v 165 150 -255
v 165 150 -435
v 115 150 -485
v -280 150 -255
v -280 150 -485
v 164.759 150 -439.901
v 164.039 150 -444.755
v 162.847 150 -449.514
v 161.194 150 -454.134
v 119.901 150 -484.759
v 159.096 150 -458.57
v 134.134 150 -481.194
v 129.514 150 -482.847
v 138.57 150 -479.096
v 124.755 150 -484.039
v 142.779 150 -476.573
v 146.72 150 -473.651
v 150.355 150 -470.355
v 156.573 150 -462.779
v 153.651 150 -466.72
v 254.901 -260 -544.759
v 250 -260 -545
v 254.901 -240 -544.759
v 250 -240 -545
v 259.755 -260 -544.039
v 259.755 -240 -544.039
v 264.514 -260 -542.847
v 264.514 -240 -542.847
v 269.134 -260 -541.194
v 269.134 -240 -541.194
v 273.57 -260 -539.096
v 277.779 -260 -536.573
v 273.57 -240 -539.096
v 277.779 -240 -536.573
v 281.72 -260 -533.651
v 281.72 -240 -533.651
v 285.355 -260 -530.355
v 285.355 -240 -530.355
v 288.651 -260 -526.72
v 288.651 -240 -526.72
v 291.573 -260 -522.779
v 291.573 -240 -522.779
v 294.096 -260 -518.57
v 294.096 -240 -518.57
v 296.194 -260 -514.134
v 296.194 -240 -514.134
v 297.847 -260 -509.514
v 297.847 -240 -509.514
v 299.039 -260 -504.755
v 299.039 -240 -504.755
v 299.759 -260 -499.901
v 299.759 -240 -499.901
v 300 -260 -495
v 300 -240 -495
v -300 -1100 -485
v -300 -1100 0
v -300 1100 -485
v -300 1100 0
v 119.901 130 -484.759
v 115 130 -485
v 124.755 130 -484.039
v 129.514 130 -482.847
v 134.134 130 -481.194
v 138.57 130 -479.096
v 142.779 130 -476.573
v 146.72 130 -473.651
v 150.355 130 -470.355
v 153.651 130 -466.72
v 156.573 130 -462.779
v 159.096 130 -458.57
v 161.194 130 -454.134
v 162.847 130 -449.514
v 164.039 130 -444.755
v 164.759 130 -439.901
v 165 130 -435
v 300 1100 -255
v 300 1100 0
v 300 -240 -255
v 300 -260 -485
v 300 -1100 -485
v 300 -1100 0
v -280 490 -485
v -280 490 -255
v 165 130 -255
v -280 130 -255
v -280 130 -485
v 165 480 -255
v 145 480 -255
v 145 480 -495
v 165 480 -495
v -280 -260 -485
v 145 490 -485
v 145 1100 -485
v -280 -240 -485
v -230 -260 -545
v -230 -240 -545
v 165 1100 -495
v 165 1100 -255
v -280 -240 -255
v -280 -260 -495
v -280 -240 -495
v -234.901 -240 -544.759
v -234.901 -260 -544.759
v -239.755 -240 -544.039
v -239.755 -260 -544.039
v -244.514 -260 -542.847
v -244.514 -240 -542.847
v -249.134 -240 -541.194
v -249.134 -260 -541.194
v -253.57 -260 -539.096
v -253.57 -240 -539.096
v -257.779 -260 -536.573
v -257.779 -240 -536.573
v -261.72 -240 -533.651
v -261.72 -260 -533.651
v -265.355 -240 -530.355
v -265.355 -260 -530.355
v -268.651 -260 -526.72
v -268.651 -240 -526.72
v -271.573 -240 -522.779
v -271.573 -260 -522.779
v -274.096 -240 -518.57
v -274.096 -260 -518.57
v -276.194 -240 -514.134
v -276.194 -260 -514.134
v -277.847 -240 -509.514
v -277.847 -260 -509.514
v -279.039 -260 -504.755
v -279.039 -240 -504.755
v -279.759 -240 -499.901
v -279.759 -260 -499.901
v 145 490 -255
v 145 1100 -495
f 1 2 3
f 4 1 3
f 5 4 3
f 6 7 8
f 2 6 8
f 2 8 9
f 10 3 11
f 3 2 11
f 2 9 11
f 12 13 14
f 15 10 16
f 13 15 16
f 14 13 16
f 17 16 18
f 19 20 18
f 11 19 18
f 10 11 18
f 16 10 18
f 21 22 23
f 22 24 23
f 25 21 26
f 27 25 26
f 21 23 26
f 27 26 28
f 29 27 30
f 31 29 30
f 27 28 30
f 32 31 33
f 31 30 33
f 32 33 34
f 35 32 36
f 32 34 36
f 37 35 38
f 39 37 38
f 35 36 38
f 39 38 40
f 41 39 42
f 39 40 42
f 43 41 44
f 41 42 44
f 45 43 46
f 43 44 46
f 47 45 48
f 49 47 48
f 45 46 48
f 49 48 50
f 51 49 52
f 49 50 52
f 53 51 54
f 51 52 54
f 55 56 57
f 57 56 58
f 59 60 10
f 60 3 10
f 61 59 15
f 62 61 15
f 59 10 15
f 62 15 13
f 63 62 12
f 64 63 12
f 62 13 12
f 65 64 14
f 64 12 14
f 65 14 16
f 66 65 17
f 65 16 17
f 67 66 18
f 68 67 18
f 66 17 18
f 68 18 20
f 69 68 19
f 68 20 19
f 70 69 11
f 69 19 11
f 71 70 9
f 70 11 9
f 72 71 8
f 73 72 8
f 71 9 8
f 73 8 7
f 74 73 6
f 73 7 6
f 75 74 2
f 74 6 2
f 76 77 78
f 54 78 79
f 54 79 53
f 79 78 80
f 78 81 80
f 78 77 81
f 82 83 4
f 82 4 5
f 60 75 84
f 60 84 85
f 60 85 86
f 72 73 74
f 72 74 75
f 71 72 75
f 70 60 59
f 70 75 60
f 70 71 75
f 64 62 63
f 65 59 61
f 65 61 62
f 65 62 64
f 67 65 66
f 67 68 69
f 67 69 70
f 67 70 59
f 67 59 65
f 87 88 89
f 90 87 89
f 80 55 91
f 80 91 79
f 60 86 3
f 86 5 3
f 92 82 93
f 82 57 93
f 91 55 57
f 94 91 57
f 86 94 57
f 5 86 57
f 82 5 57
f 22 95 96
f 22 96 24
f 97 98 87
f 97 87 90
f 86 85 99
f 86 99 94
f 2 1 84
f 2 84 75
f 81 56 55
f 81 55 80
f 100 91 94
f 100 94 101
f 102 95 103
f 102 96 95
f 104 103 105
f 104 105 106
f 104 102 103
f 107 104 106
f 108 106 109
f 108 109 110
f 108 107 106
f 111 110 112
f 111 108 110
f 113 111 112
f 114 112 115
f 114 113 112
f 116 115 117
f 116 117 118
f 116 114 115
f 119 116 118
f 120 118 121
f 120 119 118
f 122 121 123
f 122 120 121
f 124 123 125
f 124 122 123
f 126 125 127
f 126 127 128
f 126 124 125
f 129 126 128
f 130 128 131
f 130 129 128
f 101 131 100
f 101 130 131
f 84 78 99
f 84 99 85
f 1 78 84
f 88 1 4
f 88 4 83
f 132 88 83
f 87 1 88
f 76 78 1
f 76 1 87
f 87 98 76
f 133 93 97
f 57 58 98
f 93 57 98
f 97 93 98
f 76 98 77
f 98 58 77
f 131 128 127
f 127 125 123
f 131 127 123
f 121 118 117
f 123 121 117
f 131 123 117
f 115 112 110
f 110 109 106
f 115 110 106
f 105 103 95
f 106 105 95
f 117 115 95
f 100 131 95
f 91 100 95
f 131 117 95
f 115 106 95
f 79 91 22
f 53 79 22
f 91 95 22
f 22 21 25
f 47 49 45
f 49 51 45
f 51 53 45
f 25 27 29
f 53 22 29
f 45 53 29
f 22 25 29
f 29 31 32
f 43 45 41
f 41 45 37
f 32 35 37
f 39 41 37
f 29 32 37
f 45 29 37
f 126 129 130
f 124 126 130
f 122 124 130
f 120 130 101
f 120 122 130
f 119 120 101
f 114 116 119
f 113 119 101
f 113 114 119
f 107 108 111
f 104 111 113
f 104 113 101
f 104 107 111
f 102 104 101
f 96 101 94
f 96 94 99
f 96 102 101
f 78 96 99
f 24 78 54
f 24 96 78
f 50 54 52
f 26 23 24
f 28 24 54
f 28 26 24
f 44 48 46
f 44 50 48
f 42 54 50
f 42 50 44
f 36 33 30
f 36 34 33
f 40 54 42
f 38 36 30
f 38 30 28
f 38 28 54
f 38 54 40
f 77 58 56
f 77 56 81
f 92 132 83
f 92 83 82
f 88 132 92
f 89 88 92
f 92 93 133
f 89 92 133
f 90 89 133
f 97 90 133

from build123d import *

# Parameters (mm, degrees)
SKETCH_1_W          = 600
SKETCH_1_H          = 2200
EXTRUDE_1_DEPTH     = 485
SKETCH_2_W          = 230
SKETCH_2_H          = 1360
CUT_EXTRUDE_1_DEPTH = 135
SKETCH_3_W          = 230
SKETCH_3_H          = 390
CUT_EXTRUDE_2_DEPTH = 445
SKETCH_4_W          = 230
SKETCH_4_H          = 340
CUT_EXTRUDE_3_DEPTH = 445
SKETCH_5_W          = 580
SKETCH_5_H          = 290
EXTRUDE_2_DEPTH     = 20
FILLET_1_R          = 50
SKETCH_6_W          = 230
SKETCH_6_H          = 610
CUT_EXTRUDE_4_DEPTH = 20
SKETCH_7_W          = 240
SKETCH_7_H          = 620
EXTRUDE_3_DEPTH     = 20
FILLET_2_R          = 50
FILLET_3_R          = 50


with BuildPart() as part:
    # 스케치1 → 보스-돌출1 (new body)
    with BuildSketch(Plane.XY):
        Rectangle(SKETCH_1_W, SKETCH_1_H)
    extrude(amount=-EXTRUDE_1_DEPTH)

    # 스케치2 → 컷-돌출1 (cut)
    with BuildSketch(Plane(origin=(300, 0, 0), x_dir=(0, 0, -1), z_dir=(1, 0, 0))):
        with Locations((370, 420)):
            Rectangle(SKETCH_2_W, SKETCH_2_H)
    extrude(amount=-CUT_EXTRUDE_1_DEPTH, mode=Mode.SUBTRACT)

    # 스케치3 → 컷-돌출2 (cut)
    with BuildSketch(Plane(origin=(165, 0, 0), x_dir=(0, 0, -1), z_dir=(1, 0, 0))):
        with Locations((370, -65)):
            Rectangle(SKETCH_3_W, SKETCH_3_H)
    extrude(amount=-CUT_EXTRUDE_2_DEPTH, mode=Mode.SUBTRACT)

    # 스케치4 → 컷-돌출3 (cut)
    with BuildSketch(Plane(origin=(165, 0, 0), x_dir=(0, 0, -1), z_dir=(1, 0, 0))):
        with Locations((370, 320)):
            Rectangle(SKETCH_4_W, SKETCH_4_H)
    extrude(amount=-CUT_EXTRUDE_3_DEPTH, mode=Mode.SUBTRACT)

    # 스케치5 → 보스-돌출2 (add)
    with BuildSketch(Plane(origin=(0, -260, 0), x_dir=(1, 0, 0), z_dir=(0, 1, 0))):
        with Locations((10, 400)):
            Rectangle(SKETCH_5_W, SKETCH_5_H)
    extrude(amount=EXTRUDE_2_DEPTH)

    # 필렛1
    fillet_1_edges = [part.edges().sort_by_distance(p)[0] for p in [
        (300, -250, -545),
    ]]
    fillet(fillet_1_edges, radius=FILLET_1_R)

    # 스케치6 → 컷-돌출4 (cut)
    with BuildSketch(Plane(origin=(165, 0, 0), x_dir=(0, 0, -1), z_dir=(1, 0, 0))):
        with Locations((370, 795)):
            Rectangle(SKETCH_6_W, SKETCH_6_H)
    extrude(amount=-CUT_EXTRUDE_4_DEPTH, mode=Mode.SUBTRACT)

    # 스케치7 → 보스-돌출3 (add)
    with BuildSketch(Plane(origin=(145, 0, 0), x_dir=(0, 0, -1), z_dir=(1, 0, 0))):
        with Locations((375, 790)):
            Rectangle(SKETCH_7_W, SKETCH_7_H)
    extrude(amount=EXTRUDE_3_DEPTH)

    # 필렛2
    fillet_2_edges = [part.edges().sort_by_distance(p)[0] for p in [
        (-280, -250, -545),
    ]]
    fillet(fillet_2_edges, radius=FILLET_2_R)

    # 필렛3
    fillet_3_edges = [part.edges().sort_by_distance(p)[0] for p in [
        (165, 140, -485),
    ]]
    fillet(fillet_3_edges, radius=FILLET_3_R)


solid = part.part
